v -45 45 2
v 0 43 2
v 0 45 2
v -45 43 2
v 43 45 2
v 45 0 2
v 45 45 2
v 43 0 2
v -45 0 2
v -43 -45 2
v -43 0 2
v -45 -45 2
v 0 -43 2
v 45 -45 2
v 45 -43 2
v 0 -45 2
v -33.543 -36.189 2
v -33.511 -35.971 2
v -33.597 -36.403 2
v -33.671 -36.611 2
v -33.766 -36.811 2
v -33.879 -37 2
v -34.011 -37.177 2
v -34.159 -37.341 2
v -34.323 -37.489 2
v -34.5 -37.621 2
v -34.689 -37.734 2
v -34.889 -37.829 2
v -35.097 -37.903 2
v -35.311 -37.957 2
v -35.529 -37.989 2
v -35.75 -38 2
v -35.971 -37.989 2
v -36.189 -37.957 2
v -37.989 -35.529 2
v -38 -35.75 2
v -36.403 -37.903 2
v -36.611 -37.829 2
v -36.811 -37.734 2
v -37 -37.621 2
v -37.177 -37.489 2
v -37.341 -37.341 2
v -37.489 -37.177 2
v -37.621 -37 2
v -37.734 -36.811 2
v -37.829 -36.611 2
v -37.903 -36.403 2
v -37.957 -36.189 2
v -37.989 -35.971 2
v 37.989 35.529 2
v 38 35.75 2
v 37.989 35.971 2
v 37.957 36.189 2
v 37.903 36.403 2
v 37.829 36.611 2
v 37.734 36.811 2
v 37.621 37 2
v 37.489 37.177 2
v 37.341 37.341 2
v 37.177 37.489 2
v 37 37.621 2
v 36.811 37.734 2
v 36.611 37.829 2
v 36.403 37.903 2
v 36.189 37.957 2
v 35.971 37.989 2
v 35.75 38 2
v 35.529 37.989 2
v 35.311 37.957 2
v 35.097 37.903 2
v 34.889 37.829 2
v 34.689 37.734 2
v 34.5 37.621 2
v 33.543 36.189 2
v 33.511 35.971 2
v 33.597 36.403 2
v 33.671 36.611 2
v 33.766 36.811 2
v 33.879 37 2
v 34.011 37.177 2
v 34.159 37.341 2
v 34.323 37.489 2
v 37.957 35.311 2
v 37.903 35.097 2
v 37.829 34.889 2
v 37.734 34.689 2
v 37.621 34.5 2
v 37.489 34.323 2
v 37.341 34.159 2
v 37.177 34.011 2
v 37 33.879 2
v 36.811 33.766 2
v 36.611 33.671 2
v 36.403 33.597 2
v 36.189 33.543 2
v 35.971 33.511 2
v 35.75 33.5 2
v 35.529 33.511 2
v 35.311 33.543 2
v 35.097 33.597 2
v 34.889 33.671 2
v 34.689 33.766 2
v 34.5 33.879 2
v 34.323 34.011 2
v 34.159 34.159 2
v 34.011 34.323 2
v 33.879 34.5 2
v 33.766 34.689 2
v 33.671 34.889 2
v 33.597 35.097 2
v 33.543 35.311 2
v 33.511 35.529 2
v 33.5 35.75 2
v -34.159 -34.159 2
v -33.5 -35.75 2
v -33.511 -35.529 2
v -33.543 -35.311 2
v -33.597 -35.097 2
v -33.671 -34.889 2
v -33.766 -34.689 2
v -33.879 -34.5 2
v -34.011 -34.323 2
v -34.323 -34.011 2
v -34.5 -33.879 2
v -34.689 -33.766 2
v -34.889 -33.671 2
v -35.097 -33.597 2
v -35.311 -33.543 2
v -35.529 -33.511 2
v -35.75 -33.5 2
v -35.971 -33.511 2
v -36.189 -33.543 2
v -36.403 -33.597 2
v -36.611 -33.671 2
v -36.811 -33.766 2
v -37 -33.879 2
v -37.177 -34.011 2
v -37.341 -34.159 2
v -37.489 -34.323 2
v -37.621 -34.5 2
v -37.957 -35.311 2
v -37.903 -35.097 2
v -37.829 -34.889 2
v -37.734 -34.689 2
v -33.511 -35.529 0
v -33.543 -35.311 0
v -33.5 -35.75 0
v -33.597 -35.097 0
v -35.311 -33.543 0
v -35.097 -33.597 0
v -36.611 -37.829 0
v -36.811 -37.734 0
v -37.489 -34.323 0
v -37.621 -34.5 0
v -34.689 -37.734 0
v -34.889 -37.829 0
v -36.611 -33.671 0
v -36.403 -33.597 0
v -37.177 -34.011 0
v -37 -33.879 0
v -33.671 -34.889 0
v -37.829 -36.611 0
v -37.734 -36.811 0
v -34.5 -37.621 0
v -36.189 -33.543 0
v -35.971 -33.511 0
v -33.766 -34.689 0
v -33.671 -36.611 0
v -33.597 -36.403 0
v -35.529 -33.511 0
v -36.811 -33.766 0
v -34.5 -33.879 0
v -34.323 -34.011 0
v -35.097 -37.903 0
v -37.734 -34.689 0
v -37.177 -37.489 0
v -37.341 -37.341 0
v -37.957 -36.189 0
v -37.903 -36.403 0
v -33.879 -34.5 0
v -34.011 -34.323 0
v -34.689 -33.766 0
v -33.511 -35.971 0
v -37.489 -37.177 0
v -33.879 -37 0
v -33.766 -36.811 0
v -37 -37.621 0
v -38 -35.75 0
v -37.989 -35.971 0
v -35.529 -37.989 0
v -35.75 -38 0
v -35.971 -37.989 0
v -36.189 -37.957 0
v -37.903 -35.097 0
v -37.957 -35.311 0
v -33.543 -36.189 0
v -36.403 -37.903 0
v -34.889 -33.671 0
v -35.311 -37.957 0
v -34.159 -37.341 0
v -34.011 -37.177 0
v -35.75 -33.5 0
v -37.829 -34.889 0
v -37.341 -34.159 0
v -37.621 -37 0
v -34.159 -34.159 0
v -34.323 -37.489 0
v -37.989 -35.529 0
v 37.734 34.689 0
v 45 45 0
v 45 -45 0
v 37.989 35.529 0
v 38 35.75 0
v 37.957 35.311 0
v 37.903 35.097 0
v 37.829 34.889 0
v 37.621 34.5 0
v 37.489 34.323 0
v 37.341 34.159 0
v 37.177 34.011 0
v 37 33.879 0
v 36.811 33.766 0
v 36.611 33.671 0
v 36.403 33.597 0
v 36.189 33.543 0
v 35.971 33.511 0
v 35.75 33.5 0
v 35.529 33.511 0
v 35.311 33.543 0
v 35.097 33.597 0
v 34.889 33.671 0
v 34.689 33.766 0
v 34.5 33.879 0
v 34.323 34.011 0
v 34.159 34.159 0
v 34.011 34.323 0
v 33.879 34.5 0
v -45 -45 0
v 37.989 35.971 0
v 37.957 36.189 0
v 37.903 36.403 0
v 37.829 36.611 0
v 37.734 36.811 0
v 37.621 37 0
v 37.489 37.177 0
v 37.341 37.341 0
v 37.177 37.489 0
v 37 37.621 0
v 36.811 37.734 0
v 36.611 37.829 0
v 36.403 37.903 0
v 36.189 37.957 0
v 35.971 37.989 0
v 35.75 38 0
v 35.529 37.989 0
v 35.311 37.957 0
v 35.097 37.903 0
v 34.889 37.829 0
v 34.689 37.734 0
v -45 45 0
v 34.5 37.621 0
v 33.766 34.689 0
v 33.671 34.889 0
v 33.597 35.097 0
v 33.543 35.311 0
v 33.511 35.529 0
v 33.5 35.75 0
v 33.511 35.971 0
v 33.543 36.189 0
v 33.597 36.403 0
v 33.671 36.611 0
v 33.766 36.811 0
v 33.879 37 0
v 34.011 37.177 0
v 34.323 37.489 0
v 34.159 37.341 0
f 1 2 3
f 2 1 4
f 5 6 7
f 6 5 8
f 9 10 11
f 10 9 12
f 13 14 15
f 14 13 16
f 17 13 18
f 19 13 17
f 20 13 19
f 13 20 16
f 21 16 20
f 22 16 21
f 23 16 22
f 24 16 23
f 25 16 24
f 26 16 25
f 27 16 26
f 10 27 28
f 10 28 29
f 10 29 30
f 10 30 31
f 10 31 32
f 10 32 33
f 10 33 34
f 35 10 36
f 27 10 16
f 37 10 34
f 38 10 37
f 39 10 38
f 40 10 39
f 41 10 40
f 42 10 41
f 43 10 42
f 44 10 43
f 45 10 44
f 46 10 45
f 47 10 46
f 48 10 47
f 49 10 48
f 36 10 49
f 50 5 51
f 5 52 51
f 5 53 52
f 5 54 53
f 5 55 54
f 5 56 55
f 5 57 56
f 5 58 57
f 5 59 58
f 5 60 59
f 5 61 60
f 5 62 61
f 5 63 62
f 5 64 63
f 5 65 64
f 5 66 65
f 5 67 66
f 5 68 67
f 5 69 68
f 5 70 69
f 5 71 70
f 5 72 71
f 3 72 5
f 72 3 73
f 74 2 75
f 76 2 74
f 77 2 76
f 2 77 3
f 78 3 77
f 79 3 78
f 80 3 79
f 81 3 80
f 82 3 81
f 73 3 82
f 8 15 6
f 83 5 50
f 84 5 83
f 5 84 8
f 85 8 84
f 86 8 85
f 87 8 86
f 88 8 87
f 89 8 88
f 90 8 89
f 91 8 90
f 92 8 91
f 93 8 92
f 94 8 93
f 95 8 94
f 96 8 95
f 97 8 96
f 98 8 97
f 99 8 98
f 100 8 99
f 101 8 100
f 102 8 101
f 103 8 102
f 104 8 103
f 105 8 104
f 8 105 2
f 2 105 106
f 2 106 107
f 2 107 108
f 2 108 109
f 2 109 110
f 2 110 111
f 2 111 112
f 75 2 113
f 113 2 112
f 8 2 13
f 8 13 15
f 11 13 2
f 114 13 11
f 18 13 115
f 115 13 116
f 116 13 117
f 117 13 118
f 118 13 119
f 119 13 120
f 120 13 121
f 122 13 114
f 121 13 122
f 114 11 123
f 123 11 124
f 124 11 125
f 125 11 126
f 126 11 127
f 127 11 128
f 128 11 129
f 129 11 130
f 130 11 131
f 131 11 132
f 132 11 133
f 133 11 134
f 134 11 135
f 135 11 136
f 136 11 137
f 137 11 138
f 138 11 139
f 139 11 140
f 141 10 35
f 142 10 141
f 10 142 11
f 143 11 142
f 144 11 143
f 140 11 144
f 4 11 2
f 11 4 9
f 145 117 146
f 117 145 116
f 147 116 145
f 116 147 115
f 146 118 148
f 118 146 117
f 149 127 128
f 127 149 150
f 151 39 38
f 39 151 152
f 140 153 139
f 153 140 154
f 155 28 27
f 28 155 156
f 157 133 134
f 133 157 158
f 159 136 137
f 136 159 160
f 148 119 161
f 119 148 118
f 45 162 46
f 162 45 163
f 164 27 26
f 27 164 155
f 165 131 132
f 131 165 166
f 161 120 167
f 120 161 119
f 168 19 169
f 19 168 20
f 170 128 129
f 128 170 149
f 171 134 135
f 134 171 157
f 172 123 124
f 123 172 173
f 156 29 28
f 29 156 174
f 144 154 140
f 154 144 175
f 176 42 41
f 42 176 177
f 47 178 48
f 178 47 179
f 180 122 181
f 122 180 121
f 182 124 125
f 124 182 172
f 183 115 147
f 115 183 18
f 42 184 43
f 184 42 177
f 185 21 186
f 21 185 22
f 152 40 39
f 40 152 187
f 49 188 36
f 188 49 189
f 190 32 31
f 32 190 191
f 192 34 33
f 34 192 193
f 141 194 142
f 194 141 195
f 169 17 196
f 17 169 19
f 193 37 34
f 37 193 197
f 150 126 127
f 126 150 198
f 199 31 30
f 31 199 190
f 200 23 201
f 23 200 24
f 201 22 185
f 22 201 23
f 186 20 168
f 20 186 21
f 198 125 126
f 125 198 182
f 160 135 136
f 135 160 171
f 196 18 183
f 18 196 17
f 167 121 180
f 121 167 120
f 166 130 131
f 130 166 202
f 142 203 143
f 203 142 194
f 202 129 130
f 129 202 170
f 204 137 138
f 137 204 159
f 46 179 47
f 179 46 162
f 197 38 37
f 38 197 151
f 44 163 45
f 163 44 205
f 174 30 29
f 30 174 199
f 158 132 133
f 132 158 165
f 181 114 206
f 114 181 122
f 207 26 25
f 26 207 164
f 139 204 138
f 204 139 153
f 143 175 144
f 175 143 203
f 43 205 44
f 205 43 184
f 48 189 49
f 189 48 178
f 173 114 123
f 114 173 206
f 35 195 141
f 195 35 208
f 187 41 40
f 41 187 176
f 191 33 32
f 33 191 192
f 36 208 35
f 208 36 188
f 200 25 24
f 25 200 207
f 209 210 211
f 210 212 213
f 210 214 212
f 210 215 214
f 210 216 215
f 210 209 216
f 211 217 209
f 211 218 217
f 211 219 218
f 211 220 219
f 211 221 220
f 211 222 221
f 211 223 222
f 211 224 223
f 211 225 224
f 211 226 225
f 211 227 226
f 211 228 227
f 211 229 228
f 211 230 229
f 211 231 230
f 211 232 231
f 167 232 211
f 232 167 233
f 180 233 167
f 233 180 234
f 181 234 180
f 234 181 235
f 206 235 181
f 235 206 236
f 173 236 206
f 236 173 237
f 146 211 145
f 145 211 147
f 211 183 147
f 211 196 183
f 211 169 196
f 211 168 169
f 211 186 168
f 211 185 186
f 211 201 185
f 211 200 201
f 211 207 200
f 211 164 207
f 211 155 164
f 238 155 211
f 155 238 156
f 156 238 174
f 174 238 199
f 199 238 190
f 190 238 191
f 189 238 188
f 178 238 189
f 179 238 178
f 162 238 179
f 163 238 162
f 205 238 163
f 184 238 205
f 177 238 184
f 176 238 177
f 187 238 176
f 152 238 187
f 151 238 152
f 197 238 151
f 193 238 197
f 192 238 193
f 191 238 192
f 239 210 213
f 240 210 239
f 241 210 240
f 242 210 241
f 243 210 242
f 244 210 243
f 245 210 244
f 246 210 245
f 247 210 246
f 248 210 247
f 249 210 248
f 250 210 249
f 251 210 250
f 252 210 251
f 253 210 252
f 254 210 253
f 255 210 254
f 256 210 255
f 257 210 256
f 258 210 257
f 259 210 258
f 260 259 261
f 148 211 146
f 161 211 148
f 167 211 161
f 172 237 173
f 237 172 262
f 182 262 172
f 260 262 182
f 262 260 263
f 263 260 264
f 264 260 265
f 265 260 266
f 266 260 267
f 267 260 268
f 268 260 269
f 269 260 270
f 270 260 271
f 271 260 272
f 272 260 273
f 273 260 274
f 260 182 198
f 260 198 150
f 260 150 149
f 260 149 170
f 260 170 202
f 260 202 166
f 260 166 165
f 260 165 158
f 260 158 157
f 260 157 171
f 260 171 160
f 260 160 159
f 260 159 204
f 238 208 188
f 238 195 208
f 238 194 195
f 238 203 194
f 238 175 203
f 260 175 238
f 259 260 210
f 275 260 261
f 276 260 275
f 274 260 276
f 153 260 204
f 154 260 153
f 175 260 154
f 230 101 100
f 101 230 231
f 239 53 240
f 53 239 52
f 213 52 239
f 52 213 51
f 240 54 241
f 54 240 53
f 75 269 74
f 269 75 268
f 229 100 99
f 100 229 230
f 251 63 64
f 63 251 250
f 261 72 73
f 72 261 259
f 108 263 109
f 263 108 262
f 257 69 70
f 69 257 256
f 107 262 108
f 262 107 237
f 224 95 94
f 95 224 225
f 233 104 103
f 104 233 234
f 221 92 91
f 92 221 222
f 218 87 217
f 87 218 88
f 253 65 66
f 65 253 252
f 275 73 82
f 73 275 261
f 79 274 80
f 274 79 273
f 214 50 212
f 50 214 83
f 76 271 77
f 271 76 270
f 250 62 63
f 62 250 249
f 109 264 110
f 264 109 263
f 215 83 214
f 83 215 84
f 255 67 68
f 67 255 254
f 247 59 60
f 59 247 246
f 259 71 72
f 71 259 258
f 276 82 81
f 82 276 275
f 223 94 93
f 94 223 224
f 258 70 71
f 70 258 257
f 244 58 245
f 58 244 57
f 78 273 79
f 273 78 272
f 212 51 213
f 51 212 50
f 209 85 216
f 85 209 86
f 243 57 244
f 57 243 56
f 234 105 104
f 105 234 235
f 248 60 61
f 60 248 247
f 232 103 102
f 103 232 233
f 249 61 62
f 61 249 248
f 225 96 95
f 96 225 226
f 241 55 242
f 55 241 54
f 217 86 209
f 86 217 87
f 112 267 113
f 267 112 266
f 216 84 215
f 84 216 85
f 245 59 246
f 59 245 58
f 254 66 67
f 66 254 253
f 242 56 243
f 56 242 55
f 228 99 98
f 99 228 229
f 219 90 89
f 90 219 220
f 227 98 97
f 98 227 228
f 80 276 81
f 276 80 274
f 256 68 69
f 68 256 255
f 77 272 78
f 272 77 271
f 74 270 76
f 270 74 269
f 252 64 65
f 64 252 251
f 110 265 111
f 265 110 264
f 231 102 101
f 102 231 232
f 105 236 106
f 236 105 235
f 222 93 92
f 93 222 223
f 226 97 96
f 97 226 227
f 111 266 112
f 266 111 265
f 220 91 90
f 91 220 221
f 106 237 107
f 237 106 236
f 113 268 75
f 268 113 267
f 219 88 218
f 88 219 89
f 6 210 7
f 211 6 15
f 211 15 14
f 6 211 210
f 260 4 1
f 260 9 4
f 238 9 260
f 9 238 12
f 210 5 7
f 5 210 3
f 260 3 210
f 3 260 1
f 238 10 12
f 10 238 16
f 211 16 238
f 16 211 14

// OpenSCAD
// Magnetic stirrer housing (upside-down open box)
// Print orientation: top plate on bed, walls rise to open top

$fn = 64;

// --- Dimensions (mm) ---
plate_t      = 2;     // top plate thickness
wall_t       = 2.5;   // wall thickness
box_h        = 40;    // outer height of box
outer_w      = 90;    // outer size in X and Y
screw_holes  = 4;     // number of M4 screw holes
screw_pitch  = 71.5;  // square pattern pitch between hole centres
notch_w      = 12;    // cable notch width
notch_d      = 8;     // notch depth from open edge (z = 32 to z = 40)
eps          = 0.5;   // overcut for clean differences

// --- Model ---
difference() {
    // Closed top plate (now bottom)
    translate([-outer_w/2, -outer_w/2, 0])
        cube([outer_w, outer_w, plate_t]);

    // Four walls rising to open top
    for (i = [0 : 3]) {
        rotate([0, 0, i * 90])
            translate([0, -outer_w/2 - eps, plate_t])
                cube([outer_w + 2*eps, wall_t, box_h - plate_t]);
    }

    // Screw holes through top plate, centred on plate
    for (j = [0 : screw_holes - 1]) {
        a = (j - (screw_holes - 1)/2) * screw_pitch;
        translate([a, a, 0])
            cylinder(d = 4.5, h = plate_t + eps);
    }

    // Cable notch in one wall, centred along the wall
    translate([-outer_w/2 + (outer_w - notch_w)/2,
               -outer_w/2 - eps,
               box_h - notch_d])
        cube([notch_w, wall_t + 2*eps, notch_d + eps]);
}
